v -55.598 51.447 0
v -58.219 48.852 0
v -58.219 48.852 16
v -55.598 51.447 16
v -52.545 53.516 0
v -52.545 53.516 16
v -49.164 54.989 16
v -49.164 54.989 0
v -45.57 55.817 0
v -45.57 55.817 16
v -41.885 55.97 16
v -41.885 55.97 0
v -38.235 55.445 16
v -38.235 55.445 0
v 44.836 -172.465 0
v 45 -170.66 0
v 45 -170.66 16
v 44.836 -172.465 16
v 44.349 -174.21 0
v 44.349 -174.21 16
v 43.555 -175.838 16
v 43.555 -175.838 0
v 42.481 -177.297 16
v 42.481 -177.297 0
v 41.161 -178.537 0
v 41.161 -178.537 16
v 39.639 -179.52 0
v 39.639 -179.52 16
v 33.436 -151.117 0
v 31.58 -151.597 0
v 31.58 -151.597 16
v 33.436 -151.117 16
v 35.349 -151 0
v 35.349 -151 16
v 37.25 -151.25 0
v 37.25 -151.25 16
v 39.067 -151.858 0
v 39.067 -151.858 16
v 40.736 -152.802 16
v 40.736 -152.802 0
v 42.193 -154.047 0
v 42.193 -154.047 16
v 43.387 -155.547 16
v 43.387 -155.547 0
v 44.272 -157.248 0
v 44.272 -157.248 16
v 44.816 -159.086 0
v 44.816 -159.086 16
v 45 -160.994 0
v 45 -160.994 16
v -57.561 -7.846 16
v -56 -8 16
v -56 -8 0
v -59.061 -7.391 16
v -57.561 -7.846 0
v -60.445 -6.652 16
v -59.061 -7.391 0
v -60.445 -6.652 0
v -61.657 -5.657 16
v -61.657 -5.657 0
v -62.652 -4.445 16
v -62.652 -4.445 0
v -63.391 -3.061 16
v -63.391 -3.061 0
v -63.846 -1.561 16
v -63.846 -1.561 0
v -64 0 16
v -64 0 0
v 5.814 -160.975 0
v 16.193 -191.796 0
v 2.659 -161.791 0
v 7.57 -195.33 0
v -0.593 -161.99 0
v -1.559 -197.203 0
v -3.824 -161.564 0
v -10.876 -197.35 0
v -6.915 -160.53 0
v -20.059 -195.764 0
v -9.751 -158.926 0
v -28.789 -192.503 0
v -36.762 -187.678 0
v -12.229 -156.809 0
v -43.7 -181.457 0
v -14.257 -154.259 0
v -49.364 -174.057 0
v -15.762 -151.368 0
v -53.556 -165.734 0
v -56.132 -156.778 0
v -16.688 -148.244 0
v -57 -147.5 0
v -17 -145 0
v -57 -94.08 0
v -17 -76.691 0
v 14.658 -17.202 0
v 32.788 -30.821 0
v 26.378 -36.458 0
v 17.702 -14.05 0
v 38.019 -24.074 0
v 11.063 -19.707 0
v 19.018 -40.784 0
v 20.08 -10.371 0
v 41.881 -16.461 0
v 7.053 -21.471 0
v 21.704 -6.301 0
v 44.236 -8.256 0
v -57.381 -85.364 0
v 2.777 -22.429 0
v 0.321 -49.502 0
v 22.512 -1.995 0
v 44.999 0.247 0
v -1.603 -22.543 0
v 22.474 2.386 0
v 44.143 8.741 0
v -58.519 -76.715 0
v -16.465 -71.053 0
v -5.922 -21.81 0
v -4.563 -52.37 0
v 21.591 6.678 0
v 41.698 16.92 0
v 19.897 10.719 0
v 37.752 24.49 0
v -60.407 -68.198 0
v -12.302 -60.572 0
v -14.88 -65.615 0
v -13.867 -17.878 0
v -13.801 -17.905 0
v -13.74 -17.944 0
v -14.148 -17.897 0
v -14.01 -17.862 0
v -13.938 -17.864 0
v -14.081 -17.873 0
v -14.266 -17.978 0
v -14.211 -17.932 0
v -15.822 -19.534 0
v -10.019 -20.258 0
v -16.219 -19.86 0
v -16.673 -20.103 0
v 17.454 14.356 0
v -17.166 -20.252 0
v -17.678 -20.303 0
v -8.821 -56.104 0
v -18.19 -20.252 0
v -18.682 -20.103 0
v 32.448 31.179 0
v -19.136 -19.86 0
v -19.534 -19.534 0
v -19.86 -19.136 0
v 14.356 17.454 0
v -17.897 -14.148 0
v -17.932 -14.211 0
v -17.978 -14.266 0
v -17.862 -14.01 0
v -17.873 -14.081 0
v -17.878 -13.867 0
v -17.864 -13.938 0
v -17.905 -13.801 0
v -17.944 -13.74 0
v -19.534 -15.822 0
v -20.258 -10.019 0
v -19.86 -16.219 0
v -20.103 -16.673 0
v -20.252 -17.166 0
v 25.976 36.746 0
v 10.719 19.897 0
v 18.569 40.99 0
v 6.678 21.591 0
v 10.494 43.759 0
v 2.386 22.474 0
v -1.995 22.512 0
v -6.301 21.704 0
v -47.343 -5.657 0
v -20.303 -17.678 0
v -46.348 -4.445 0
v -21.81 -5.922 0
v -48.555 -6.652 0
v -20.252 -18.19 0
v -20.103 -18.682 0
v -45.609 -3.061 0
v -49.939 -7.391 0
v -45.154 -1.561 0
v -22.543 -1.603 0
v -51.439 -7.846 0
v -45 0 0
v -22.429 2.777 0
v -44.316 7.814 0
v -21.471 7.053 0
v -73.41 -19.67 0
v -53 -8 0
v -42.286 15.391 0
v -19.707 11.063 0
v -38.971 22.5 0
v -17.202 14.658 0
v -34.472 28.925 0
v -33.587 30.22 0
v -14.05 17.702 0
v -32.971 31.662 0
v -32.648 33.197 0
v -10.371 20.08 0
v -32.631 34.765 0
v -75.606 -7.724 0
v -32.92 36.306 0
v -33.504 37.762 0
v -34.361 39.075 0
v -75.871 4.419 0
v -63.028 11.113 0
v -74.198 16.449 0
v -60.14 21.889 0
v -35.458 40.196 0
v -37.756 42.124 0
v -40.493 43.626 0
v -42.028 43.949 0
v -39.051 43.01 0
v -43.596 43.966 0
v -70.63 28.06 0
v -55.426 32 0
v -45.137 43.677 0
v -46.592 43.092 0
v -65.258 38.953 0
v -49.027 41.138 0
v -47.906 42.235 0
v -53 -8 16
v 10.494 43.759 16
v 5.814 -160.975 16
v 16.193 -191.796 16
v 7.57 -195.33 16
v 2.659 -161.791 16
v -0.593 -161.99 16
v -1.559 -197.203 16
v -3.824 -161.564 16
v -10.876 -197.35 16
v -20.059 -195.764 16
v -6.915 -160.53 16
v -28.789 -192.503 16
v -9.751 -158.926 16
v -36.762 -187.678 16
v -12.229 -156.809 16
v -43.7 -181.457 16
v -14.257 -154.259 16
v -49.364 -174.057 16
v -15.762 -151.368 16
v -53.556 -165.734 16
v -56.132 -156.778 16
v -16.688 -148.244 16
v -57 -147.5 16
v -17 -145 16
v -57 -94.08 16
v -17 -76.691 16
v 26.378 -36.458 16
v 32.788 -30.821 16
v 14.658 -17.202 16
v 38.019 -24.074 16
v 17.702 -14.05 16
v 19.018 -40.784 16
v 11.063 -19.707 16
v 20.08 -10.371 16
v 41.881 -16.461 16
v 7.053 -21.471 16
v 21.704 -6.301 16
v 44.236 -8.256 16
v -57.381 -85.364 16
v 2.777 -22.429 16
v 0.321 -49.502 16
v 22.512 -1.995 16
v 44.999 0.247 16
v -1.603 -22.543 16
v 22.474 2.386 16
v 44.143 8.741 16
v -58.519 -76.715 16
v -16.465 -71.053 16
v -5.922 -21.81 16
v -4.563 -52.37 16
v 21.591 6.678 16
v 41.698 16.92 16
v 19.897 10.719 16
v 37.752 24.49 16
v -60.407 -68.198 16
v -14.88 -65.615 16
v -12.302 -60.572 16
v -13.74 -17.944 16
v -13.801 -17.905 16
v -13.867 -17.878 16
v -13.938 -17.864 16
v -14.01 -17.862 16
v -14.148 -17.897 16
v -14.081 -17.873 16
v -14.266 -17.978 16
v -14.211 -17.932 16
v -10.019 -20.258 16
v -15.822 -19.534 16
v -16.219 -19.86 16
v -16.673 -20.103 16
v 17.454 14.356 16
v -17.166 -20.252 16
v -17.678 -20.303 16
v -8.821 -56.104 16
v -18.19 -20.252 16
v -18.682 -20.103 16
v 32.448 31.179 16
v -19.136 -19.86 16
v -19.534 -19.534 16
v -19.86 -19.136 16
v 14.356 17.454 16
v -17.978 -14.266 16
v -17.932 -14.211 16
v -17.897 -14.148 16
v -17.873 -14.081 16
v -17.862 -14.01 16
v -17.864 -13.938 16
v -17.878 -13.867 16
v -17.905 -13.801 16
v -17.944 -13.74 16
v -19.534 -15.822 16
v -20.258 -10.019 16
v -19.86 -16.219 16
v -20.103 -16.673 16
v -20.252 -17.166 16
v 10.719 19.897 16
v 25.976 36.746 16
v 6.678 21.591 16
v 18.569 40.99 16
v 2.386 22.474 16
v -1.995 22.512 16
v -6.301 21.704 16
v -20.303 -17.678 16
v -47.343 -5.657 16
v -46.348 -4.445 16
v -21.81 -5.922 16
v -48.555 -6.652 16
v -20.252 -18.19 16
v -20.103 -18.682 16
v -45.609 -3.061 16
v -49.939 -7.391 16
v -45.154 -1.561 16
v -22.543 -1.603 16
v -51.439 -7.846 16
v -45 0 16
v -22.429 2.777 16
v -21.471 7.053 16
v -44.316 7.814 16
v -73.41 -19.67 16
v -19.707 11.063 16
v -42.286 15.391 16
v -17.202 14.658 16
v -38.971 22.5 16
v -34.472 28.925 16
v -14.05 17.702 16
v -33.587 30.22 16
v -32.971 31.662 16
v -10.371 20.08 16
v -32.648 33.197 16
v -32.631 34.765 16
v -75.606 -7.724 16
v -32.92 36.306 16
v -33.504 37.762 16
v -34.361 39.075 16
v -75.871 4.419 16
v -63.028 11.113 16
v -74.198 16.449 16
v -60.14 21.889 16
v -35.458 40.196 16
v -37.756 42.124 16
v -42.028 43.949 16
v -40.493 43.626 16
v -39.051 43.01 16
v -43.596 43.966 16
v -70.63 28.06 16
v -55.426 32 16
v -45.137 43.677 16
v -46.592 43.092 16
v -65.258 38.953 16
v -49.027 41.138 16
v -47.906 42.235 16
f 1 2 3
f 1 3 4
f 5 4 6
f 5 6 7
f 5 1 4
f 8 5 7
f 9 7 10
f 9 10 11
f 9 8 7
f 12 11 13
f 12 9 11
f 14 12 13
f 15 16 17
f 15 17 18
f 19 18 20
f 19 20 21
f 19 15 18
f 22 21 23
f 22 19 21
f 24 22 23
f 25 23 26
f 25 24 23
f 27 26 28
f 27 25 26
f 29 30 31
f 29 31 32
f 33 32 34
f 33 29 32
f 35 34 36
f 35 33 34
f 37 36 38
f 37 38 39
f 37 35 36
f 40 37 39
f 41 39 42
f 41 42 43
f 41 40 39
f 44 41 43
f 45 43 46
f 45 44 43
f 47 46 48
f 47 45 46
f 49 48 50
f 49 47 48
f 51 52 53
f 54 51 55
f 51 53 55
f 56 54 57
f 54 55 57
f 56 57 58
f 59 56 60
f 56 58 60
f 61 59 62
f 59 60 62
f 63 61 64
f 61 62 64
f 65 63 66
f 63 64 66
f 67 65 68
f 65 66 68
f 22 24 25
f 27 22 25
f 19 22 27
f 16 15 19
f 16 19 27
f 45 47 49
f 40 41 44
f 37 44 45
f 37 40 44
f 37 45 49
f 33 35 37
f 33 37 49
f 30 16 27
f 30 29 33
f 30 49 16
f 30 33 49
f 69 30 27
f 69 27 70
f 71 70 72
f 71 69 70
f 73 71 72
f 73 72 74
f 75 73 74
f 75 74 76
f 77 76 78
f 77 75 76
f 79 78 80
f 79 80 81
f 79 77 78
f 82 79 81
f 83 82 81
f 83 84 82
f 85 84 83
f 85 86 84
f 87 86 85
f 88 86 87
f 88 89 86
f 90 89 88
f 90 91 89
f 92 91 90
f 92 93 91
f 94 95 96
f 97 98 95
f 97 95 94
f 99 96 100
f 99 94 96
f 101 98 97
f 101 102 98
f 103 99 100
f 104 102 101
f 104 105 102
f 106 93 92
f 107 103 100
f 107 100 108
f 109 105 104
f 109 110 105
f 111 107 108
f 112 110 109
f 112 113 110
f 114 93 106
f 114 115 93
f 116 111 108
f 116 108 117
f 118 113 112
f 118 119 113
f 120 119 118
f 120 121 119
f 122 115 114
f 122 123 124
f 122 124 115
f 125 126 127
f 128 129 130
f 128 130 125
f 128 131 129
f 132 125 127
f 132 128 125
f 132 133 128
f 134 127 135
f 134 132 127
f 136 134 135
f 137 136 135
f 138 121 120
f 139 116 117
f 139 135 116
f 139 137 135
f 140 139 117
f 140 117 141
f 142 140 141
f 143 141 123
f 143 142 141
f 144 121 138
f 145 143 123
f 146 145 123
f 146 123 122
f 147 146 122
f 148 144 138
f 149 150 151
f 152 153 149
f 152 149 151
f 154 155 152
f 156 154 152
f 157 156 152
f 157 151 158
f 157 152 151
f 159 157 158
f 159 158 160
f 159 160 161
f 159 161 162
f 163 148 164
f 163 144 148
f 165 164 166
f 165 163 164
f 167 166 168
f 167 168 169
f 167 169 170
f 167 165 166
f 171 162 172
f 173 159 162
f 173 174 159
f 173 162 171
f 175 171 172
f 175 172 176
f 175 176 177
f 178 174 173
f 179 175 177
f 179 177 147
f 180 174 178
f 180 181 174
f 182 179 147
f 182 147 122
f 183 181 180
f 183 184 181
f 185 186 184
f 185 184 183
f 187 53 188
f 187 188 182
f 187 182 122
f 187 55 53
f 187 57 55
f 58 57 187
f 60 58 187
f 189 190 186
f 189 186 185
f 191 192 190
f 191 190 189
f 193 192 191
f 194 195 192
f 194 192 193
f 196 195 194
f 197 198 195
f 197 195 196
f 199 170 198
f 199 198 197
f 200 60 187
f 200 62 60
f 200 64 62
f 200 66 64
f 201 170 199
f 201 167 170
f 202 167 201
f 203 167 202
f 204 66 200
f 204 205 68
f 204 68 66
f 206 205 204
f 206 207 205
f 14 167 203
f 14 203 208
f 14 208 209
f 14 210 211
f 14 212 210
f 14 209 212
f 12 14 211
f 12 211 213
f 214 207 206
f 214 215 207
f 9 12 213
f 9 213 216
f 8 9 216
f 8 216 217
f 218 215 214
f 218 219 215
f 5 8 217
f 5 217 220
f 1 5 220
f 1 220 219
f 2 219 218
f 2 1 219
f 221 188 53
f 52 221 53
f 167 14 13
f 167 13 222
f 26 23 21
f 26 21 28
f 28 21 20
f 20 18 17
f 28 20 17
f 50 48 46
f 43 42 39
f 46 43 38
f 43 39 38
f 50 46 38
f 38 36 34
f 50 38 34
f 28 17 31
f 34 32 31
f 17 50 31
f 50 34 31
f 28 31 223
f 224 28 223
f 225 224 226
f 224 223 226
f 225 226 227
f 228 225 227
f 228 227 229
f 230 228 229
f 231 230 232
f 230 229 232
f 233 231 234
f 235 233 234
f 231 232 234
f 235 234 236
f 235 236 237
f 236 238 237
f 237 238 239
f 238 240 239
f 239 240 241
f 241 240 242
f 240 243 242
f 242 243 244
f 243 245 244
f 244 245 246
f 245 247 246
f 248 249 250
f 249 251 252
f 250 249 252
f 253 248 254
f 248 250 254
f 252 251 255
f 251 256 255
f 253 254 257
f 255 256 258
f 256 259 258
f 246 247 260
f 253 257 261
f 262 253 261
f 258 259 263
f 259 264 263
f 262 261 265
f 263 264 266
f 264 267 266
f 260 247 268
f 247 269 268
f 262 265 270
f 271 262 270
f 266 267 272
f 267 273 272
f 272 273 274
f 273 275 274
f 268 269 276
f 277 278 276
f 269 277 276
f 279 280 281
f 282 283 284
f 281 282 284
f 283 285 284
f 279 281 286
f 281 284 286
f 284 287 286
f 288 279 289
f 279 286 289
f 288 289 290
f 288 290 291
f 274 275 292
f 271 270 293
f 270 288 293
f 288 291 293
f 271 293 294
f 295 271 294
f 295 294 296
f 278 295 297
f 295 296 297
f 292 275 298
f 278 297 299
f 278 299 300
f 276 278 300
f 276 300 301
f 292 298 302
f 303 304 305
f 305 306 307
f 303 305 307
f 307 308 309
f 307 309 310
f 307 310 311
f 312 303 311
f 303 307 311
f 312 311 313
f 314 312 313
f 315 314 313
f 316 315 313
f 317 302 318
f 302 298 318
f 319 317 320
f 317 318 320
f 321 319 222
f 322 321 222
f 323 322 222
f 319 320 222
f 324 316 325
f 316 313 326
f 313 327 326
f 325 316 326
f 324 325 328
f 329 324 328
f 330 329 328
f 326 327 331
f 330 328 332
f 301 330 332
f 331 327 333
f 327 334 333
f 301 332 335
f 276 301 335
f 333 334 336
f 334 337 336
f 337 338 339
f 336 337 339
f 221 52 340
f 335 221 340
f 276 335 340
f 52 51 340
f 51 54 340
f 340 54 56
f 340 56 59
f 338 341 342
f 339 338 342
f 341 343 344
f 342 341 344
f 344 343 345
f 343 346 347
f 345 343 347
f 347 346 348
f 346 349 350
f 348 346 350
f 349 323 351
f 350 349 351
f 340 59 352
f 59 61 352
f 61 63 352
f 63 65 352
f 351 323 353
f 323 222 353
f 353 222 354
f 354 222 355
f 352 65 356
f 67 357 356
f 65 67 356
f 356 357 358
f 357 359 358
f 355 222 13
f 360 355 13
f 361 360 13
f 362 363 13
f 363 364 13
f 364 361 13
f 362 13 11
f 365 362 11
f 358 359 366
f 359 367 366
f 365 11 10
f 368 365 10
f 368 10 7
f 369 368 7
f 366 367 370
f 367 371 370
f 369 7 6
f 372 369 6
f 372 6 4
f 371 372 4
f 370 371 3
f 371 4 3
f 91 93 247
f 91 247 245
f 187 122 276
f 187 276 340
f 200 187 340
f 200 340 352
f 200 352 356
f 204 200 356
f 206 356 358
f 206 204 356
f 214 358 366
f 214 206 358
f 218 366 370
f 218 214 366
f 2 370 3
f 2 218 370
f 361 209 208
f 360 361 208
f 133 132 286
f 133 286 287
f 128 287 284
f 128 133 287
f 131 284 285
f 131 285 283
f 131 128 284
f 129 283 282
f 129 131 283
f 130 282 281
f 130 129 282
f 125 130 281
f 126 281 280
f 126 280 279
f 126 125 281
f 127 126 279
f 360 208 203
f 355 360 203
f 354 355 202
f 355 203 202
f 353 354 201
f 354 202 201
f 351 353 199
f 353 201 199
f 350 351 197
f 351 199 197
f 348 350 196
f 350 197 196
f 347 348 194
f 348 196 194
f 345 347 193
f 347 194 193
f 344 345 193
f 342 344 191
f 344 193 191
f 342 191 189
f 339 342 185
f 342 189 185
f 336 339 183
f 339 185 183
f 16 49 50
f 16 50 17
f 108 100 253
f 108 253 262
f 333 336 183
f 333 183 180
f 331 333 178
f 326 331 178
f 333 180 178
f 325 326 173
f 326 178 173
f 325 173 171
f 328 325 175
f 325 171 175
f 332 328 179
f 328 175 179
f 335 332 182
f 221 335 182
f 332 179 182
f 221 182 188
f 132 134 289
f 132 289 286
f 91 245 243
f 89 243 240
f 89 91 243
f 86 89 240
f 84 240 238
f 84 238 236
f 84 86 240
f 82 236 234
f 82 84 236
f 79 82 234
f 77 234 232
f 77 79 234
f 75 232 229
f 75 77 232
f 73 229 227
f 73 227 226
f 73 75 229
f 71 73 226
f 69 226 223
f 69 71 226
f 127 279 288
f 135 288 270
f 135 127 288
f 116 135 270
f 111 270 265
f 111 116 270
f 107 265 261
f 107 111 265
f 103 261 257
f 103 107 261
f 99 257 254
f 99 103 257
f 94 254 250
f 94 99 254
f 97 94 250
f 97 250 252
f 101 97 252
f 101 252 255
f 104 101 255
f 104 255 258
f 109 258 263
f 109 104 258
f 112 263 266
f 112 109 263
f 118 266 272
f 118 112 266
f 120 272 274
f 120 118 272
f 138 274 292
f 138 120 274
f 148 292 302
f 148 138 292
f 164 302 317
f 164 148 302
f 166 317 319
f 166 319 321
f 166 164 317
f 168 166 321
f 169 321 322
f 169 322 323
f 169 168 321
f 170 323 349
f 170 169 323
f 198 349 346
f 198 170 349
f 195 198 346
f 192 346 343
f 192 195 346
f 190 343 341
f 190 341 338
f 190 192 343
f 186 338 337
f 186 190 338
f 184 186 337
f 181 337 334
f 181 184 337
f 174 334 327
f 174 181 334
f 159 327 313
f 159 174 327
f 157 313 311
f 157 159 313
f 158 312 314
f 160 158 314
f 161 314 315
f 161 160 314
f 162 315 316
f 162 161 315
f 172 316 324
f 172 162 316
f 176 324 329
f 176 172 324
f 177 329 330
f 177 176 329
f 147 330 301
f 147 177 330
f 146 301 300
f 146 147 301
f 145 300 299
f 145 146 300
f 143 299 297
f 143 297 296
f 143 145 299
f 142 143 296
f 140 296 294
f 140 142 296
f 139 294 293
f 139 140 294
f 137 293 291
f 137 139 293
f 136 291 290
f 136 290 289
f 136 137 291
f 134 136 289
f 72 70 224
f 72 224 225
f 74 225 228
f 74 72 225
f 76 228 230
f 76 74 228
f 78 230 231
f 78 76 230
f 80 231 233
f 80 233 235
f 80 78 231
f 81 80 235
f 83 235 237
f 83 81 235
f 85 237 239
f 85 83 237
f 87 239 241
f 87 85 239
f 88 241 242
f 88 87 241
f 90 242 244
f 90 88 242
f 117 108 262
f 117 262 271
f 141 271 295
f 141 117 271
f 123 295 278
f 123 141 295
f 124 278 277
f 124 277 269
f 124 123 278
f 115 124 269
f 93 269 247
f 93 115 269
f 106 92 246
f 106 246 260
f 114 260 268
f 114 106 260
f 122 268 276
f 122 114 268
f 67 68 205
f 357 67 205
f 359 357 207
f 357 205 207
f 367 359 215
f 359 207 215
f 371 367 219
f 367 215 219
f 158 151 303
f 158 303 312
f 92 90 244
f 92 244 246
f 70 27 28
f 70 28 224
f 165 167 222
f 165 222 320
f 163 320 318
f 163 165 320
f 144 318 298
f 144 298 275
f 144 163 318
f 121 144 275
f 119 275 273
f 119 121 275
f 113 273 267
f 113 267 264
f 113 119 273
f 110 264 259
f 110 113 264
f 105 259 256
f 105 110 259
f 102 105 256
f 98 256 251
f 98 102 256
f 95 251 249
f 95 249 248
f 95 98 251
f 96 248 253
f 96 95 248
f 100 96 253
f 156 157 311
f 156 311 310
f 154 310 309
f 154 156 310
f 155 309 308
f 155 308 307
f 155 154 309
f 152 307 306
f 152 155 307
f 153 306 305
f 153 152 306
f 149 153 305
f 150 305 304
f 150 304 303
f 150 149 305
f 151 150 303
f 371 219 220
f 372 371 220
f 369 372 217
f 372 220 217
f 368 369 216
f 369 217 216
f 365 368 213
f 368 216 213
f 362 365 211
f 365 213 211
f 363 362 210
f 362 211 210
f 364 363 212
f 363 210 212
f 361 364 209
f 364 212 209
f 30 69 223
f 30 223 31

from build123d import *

# Parameters (mm, degrees)
BASE_EXTRUDE_DEPTH = 16


with BuildPart() as part:
    # Sketch1 → Base-Extrude (new body)
    with BuildSketch(Plane.XY):
        with BuildLine():
            Line((5.814342437, -160.974774553), (31.579798567, -151.59691545))
            ThreePointArc((31.579798567, -151.59691545), (40.735764364, -152.802321215), (45, -160.993841658))
            Line((45, -160.993841658), (45, -170.660453173))
            ThreePointArc((45, -170.660453173), (43.555274843, -175.838027157), (39.638545529, -179.519566863))
            Line((39.638545529, -179.519566863), (16.192727646, -191.79556845))
            ThreePointArc((16.192727646, -191.79556845), (-32.887869917, -190.276374217), (-57, -147.5))
            Line((-57, -147.5), (-57, -94.079804919))
            ThreePointArc((-57, -94.079804919), (-57.855513863, -81.027185697), (-60.407417371, -68.197900409))
            Line((-60.407417371, -68.197900409), (-73.410362798, -19.670247428))
            ThreePointArc((-73.410362798, -19.670247428), (-74.198496541, 16.449410659), (-58.219377677, 48.851858336))
            ThreePointArc((-58.219377677, 48.851858336), (-49.164213844, 54.989280966), (-38.234596516, 55.444707856))
            Line((-38.234596516, 55.444707856), (10.493757672, 43.759353856))
            ThreePointArc((10.493757672, 43.759353856), (44.773001659, 4.514235528), (19.017821778, -40.783850417))
            Line((19.017821778, -40.783850417), (0.321452148, -49.502110755))
            ThreePointArc((0.321452148, -49.502110755), (-12.301743374, -60.572356116), (-17, -76.691344366))
            Line((-17, -76.691344366), (-17, -145))
            ThreePointArc((-17, -145), (-9.750799418, -158.925584753), (5.814342437, -160.974774553))
        make_face()
        with BuildLine():
            Line((-15.821514229, -19.53382483), (-14.266024685, -17.978335287))
            ThreePointArc((-14.266024685, -17.978335287), (-14.009543632, -17.862047616), (-13.739996199, -17.943592295))
            ThreePointArc((-13.739996199, -17.943592295), (15.980613255, 15.980613255), (-17.943592295, -13.739996199))
            ThreePointArc((-17.943592295, -13.739996199), (-17.862047616, -14.009543632), (-17.978335287, -14.266024685))
            Line((-17.978335287, -14.266024685), (-19.53382483, -15.821514229))
            ThreePointArc((-19.53382483, -15.821514229), (-19.53382483, -19.53382483), (-15.821514229, -19.53382483))
        make_face(mode=Mode.SUBTRACT)
        with BuildLine():
            Line((-53, -8), (-56, -8))
            ThreePointArc((-56, -8), (-61.656854249, -5.656854249), (-64, 0))
            ThreePointArc((-64, 0), (-60.14032773, 21.889289173), (-49.02684436, 41.13840702))
            ThreePointArc((-49.02684436, 41.13840702), (-43.595734757, 43.965663727), (-37.756187937, 42.124461687))
            Line((-37.756187937, 42.124461687), (-35.458054608, 40.196098858))
            ThreePointArc((-35.458054608, 40.196098858), (-32.630797901, 34.764989255), (-34.47199994, 28.925442436))
            ThreePointArc((-34.47199994, 28.925442436), (-42.286167935, 15.39090645), (-45, 0))
            ThreePointArc((-45, 0), (-47.343145751, -5.656854249), (-53, -8))
        make_face(mode=Mode.SUBTRACT)
    extrude(amount=BASE_EXTRUDE_DEPTH)


solid = part.part
